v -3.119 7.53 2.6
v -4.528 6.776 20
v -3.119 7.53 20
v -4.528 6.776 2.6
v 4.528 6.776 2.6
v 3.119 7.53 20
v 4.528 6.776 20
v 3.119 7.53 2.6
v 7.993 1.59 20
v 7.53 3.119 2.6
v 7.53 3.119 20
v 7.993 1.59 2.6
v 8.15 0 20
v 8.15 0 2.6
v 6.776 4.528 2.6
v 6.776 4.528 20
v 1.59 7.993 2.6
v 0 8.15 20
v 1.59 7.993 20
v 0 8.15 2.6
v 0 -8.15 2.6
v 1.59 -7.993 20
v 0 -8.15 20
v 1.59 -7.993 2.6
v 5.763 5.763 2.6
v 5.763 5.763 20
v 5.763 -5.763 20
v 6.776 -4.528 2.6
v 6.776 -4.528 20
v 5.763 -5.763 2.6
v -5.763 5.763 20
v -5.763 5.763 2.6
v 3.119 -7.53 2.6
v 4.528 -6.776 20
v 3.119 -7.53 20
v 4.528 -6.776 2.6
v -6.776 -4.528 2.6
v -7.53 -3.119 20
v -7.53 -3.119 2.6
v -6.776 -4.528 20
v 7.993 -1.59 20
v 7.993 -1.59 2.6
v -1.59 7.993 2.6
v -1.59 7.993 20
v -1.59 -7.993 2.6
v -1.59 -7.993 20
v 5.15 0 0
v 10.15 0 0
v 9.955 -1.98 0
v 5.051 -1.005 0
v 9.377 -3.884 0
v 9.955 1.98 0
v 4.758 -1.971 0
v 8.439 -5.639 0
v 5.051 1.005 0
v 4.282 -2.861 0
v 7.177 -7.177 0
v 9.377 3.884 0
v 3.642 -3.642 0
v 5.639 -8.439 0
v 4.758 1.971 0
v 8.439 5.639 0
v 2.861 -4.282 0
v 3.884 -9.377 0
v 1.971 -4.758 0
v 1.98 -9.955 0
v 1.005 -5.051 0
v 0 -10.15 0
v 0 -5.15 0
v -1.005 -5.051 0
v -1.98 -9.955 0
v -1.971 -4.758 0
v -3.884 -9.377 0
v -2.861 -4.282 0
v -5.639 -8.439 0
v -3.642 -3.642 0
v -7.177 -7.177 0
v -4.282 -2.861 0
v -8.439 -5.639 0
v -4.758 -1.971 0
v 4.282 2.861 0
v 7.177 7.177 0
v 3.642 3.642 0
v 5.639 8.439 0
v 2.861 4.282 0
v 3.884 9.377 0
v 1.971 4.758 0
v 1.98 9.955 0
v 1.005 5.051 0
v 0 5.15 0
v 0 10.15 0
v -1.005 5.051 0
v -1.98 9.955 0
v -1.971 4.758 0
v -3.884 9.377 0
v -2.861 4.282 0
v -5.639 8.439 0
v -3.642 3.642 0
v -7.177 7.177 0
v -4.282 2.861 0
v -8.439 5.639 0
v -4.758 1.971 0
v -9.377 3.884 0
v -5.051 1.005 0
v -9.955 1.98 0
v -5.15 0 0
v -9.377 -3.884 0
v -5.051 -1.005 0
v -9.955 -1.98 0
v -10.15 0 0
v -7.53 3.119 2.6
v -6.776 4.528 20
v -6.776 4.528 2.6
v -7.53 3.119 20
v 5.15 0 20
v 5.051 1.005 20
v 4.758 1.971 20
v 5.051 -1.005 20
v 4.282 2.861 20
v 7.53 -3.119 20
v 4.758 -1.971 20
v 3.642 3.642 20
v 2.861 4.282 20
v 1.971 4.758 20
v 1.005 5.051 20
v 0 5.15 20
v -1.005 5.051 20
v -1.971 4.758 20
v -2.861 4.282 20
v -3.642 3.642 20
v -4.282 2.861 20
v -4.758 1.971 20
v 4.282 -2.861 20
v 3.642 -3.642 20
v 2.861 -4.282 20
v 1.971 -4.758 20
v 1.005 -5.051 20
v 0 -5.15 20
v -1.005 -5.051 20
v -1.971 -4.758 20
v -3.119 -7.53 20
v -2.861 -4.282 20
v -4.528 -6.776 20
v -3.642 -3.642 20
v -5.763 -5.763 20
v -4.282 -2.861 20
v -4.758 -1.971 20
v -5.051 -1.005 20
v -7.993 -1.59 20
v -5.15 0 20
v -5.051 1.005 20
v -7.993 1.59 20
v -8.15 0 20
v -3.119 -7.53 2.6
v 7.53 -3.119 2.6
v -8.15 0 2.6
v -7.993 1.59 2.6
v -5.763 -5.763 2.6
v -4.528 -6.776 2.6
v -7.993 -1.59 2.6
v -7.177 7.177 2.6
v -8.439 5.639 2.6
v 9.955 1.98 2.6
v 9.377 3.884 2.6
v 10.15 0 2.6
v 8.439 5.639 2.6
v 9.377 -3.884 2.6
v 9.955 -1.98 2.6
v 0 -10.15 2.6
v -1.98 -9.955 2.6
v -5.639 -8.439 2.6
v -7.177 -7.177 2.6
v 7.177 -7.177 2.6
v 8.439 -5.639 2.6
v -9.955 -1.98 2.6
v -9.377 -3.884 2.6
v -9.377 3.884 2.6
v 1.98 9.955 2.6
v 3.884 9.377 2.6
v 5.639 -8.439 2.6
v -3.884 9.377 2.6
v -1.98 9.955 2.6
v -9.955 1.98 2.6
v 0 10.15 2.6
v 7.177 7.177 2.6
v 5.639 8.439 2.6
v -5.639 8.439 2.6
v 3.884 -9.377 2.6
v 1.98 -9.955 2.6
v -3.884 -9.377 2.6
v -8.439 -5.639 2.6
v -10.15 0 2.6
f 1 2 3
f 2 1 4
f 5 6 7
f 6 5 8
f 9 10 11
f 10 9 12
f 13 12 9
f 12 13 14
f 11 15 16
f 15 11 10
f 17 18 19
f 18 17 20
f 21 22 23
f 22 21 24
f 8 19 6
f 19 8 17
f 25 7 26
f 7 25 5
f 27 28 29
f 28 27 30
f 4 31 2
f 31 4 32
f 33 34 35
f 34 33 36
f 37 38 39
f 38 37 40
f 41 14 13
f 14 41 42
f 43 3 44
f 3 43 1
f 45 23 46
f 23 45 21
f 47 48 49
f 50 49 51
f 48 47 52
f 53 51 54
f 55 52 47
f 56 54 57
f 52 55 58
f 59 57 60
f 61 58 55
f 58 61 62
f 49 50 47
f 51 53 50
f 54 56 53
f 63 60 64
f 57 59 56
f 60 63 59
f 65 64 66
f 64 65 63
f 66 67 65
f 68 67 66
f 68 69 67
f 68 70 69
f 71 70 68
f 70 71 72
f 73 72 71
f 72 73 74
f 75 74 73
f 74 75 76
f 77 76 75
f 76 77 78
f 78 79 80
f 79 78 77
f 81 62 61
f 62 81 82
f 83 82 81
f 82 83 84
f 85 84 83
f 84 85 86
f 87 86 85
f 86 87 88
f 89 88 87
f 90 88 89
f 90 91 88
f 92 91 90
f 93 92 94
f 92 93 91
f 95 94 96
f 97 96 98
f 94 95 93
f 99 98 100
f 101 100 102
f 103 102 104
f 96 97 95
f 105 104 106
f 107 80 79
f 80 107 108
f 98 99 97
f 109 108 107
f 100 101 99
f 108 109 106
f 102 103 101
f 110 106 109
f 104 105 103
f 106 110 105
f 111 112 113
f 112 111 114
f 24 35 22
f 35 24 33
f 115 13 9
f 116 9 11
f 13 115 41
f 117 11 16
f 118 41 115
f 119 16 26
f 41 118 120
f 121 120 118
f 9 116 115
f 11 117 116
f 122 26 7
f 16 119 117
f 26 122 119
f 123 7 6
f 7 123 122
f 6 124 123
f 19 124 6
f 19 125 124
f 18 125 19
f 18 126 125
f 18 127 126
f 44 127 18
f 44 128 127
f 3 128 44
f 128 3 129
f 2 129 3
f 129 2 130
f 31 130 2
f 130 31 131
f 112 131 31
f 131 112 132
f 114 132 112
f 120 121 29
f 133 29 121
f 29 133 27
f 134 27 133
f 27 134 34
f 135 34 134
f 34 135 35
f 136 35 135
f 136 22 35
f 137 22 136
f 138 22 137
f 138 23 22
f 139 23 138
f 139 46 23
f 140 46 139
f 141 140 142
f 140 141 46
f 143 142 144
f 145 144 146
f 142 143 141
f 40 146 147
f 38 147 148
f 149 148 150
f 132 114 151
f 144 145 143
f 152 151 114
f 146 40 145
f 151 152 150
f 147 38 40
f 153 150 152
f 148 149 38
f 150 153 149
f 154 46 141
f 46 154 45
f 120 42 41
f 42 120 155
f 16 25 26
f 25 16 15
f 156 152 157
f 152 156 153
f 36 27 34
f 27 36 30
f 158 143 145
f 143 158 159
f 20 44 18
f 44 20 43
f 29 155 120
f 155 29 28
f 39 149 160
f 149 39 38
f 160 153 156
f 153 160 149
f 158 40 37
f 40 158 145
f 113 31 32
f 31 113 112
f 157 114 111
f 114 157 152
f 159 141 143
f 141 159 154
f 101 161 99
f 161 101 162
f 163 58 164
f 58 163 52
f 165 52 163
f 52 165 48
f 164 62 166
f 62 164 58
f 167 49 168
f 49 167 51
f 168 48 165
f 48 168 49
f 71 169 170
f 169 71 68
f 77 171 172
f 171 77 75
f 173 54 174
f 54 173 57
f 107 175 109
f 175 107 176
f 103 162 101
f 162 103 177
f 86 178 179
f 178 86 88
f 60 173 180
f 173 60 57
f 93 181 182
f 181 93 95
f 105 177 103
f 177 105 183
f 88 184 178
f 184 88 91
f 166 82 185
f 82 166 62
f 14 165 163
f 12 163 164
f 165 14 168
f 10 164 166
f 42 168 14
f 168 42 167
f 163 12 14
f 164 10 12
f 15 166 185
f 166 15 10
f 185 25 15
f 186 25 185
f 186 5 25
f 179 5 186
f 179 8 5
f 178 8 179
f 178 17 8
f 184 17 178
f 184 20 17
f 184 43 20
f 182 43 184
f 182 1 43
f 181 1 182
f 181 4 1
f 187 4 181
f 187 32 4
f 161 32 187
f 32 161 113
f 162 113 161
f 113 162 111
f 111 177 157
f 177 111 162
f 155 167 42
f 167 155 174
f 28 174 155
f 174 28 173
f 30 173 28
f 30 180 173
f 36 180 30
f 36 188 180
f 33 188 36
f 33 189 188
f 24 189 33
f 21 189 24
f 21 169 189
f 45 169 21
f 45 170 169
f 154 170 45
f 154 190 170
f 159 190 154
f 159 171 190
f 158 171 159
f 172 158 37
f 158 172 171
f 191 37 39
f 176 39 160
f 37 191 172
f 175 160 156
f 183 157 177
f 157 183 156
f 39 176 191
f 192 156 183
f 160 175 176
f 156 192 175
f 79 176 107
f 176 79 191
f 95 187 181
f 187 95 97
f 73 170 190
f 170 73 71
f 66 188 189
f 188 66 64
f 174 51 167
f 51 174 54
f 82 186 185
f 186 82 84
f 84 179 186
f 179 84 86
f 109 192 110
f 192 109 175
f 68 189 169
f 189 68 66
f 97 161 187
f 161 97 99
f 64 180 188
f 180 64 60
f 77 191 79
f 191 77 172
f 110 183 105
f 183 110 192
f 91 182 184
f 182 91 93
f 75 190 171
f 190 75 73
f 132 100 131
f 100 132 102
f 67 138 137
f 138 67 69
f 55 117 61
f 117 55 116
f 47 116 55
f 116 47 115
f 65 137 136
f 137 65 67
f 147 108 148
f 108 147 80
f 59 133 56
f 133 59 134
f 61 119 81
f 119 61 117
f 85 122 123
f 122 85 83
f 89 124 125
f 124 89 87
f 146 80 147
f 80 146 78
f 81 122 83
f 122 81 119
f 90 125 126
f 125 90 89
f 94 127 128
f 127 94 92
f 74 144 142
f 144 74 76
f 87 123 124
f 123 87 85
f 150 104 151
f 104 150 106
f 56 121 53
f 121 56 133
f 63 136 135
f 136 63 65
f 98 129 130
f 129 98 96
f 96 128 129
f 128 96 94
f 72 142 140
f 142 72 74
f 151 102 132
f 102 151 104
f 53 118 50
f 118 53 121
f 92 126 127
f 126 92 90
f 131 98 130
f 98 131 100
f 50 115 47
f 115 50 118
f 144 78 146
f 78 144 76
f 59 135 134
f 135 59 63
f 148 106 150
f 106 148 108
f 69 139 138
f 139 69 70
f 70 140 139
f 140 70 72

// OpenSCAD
$fn = 32;

// ----------------------------------------------------------------------
// Spacer sleeve: 16.3 / 10.3 x 20 mm
// ----------------------------------------------------------------------

// --- parameters (mm) ---
tube_d = 16.3;            // outside diameter
bore_d = 10.3;            // shaft bore
tube_l = 20;              // sleeve length
flange_d = 20.3;          // collar diameter
flange_t = 2;             // collar thickness

module sleeve() {
  cylinder(h = tube_l, d = tube_d);
  cylinder(h = flange_t + 0.6, d = flange_d);
}

difference() {
  sleeve();
  translate([0, 0, -1]) cylinder(h = tube_l + 2, d = bore_d);
}
